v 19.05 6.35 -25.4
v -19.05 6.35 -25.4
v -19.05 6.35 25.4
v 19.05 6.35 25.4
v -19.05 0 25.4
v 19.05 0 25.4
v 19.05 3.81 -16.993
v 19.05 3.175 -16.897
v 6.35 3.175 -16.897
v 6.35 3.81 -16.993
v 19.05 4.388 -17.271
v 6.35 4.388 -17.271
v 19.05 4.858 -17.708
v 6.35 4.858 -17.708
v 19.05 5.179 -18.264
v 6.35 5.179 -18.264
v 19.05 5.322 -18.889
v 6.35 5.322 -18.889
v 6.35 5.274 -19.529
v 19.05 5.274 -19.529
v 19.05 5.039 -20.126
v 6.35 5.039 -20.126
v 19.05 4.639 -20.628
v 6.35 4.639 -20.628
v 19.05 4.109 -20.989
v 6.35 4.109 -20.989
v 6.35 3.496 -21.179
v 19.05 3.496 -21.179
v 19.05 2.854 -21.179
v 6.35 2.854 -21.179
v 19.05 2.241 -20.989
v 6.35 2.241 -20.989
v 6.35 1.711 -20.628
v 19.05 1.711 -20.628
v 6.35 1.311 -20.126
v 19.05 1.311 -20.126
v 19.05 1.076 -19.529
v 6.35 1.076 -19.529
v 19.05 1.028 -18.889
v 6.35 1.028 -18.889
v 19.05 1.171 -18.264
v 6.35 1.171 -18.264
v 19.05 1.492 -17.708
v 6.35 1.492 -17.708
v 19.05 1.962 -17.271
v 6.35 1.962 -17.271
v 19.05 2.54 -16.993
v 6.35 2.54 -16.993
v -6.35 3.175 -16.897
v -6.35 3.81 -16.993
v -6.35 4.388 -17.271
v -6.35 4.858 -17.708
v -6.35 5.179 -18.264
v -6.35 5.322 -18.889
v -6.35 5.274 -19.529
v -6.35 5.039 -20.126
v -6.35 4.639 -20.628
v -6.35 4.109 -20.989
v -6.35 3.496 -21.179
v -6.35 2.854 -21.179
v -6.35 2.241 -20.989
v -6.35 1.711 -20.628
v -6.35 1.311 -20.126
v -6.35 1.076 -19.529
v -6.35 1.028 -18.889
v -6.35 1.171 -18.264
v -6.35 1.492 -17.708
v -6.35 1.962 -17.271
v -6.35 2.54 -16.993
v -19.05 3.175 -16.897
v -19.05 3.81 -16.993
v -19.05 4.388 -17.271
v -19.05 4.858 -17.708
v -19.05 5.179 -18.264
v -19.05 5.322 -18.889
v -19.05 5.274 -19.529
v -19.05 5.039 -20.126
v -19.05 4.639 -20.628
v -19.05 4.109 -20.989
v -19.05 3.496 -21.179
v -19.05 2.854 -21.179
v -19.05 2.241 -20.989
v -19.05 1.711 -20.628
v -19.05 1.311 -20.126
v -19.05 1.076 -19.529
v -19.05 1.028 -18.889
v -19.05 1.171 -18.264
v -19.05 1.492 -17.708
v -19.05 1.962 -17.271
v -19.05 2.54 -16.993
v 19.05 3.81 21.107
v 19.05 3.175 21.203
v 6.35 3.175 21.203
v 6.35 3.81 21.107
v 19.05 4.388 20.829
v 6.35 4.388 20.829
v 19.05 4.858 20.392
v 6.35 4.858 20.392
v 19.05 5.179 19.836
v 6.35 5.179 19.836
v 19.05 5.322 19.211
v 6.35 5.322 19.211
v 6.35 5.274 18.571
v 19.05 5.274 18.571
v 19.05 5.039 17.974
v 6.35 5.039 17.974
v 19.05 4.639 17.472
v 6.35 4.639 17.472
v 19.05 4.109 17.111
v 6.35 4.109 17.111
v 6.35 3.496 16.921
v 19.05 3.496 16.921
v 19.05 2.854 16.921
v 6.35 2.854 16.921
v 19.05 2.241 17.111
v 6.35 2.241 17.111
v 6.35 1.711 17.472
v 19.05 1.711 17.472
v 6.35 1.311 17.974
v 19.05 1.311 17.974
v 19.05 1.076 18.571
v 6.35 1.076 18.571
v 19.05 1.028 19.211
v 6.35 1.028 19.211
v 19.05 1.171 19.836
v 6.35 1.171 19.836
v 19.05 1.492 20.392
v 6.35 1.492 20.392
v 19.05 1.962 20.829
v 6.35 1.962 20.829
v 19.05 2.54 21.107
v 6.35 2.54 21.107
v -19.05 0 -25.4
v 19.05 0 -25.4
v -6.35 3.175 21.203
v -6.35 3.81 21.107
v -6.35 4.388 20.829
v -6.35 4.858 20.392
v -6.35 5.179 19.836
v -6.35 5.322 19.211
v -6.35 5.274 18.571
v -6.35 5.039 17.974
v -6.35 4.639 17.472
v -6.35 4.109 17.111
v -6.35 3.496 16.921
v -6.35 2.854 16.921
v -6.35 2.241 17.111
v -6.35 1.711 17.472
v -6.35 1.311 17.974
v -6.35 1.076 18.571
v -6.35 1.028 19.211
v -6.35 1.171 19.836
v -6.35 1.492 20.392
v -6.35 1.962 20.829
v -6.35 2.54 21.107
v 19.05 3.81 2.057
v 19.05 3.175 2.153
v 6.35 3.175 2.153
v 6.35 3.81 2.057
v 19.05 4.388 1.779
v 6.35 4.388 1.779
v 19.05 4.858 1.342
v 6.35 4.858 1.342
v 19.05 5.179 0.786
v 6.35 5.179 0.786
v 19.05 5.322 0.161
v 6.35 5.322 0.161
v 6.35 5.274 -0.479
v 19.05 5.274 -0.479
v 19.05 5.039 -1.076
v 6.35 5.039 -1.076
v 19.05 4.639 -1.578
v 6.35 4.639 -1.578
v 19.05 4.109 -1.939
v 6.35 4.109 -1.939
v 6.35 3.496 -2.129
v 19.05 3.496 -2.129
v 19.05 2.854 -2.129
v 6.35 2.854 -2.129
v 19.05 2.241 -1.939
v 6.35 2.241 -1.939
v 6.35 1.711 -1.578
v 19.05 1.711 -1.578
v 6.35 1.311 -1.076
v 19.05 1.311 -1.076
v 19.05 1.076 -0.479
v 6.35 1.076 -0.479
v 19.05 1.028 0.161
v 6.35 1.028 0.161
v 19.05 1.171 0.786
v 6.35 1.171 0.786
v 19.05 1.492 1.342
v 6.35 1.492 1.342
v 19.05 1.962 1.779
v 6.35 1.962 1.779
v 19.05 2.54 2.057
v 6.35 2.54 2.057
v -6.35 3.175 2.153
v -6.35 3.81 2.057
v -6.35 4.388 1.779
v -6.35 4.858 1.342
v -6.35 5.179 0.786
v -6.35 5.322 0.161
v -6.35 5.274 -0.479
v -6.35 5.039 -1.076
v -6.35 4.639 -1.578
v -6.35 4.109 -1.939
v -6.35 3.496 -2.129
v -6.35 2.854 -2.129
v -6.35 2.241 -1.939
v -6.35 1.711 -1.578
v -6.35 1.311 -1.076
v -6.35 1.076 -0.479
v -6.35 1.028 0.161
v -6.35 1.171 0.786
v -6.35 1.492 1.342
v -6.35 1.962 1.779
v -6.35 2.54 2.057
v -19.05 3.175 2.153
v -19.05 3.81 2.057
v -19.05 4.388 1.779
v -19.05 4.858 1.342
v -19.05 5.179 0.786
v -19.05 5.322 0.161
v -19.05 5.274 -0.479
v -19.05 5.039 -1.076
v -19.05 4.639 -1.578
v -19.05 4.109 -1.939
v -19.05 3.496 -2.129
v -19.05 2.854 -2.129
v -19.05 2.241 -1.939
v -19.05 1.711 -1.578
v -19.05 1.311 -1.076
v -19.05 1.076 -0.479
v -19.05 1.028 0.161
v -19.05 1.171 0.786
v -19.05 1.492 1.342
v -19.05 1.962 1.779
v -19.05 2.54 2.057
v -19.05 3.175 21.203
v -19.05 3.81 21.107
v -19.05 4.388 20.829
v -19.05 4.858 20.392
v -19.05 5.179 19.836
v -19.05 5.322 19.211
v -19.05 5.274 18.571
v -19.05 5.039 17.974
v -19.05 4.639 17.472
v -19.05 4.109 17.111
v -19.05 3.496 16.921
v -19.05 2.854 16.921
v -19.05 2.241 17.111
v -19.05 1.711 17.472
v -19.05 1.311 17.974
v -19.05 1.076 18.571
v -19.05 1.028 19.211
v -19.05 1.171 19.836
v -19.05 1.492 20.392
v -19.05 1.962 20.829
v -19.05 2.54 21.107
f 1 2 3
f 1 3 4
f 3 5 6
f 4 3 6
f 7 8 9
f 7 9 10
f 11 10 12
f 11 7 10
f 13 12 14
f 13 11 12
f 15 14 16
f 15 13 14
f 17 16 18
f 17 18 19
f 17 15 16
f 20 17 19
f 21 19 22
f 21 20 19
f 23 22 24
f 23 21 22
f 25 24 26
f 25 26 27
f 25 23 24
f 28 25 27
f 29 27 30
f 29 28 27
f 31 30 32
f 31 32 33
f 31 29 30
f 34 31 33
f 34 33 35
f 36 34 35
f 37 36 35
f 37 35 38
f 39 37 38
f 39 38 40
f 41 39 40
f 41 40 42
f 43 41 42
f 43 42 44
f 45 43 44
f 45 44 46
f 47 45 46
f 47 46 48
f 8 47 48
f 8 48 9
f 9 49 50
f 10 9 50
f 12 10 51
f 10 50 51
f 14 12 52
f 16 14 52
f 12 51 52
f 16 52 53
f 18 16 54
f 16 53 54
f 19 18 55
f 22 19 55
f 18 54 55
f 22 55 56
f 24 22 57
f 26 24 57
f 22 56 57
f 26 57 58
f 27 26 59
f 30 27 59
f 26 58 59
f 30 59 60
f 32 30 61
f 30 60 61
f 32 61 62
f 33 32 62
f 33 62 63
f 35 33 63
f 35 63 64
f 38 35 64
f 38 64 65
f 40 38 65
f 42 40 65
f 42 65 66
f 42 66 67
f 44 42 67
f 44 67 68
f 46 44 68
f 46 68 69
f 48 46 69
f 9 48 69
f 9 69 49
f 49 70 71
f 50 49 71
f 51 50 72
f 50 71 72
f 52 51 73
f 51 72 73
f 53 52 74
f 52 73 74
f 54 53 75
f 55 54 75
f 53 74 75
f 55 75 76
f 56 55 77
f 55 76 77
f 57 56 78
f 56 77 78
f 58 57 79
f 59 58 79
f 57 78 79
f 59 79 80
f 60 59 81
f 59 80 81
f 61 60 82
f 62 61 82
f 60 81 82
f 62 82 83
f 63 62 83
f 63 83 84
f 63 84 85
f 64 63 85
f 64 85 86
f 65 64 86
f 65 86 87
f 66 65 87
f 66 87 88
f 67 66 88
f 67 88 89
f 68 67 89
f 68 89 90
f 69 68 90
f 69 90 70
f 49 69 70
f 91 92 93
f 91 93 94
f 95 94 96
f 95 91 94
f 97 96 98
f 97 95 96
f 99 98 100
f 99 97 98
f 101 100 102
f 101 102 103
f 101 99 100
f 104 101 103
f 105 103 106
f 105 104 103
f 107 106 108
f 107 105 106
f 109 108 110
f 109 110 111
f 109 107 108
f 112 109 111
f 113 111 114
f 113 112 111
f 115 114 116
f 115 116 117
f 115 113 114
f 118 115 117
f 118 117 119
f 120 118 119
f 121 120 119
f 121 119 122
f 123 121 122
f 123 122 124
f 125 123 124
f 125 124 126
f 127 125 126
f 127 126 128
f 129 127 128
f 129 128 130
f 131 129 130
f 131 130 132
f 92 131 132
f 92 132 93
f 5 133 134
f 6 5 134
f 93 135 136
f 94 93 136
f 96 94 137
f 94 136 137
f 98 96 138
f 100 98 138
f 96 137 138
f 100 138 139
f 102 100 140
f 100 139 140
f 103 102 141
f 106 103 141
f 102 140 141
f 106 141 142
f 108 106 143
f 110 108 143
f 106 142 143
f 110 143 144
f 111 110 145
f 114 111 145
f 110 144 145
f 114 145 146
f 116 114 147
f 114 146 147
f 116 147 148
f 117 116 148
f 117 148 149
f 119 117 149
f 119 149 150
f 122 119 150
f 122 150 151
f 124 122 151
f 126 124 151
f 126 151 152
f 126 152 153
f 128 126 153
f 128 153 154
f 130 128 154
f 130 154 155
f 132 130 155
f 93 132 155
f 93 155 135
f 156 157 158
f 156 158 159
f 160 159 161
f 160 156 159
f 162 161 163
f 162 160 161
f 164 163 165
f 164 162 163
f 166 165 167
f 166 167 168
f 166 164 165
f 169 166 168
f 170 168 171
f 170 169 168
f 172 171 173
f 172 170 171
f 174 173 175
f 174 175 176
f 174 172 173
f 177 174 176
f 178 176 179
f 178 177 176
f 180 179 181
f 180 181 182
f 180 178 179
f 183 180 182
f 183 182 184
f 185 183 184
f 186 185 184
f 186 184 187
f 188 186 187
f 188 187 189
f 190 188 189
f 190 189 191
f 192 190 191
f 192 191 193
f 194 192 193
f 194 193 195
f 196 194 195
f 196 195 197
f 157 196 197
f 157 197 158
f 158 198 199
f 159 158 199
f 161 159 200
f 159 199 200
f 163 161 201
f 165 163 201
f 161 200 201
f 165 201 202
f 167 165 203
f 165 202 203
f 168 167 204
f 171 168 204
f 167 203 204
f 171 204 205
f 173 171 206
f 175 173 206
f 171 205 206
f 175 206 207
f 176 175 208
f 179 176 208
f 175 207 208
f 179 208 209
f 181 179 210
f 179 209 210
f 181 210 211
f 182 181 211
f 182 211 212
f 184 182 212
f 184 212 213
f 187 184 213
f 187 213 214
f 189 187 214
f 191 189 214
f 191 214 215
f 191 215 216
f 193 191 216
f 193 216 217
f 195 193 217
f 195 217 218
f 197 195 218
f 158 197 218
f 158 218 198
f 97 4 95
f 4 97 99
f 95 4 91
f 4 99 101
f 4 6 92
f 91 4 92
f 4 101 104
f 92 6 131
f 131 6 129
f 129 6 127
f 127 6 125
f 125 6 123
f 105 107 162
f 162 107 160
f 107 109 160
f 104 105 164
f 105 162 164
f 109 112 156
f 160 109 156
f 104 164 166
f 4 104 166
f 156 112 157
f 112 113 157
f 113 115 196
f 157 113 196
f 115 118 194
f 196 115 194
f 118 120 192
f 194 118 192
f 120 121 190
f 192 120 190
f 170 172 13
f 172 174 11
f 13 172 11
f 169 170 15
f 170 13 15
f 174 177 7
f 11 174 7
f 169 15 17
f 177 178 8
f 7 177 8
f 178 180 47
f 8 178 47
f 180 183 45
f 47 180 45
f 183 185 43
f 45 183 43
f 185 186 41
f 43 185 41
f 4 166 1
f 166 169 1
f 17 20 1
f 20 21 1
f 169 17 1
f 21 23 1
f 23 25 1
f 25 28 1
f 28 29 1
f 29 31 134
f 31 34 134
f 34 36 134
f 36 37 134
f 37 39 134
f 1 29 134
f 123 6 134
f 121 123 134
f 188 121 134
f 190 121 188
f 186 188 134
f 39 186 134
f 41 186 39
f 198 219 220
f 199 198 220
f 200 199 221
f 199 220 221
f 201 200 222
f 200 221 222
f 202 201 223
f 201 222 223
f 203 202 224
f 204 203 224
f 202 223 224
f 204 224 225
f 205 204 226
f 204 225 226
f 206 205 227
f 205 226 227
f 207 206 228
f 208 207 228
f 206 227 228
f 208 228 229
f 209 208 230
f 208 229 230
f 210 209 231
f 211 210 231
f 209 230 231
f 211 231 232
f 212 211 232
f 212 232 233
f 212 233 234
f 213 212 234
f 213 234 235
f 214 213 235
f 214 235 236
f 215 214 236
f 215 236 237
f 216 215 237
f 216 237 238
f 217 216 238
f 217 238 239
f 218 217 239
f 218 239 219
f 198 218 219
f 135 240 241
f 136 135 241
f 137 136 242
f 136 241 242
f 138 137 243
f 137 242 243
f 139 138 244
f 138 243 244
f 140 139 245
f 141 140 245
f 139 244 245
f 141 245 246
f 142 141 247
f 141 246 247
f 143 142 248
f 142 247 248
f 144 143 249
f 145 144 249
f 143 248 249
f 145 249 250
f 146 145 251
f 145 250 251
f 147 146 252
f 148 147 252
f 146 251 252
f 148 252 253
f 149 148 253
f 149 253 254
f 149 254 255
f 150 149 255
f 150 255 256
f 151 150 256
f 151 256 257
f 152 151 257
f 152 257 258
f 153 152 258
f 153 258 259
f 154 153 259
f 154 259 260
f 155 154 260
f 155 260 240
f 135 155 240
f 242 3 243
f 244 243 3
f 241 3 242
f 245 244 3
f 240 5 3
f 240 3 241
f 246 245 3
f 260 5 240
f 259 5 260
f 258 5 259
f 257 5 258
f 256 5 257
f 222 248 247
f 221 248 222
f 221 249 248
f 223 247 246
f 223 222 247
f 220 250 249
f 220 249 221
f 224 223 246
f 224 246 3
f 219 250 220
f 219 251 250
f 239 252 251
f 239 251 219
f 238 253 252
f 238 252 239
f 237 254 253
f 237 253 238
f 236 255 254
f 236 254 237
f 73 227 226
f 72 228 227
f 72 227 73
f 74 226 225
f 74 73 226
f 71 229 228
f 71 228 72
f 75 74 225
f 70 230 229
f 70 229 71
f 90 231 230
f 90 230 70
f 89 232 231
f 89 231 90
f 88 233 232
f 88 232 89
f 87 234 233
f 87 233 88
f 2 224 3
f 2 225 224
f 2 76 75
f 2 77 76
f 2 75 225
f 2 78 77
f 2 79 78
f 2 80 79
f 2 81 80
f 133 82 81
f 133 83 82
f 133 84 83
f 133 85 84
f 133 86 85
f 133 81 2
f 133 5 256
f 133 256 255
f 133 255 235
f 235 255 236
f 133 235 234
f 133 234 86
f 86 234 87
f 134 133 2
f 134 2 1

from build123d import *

# Parameters (mm, degrees)
SKETCH1_W           = 38.1
SKETCH1_H           = 50.8
BOSS_EXTRUDE1_DEPTH = 6.35
SKETCH2_R           = 2.15265
CUT_EXTRUDE1_DEPTH  = 25.4


with BuildPart() as part:
    # Sketch1 → Boss-Extrude1 (new body)
    with BuildSketch(Plane(origin=(0, 0, 0), x_dir=(1, 0, 0), z_dir=(0, 1, 0))):
        Rectangle(SKETCH1_W, SKETCH1_H)
    extrude(amount=BOSS_EXTRUDE1_DEPTH)

    # Sketch2 → Cut-Extrude1 (cut)
    with BuildSketch(Plane.ZY.offset(19.05)):
        with Locations((-19.05, 3.175)):
            Circle(SKETCH2_R)
        with Locations((0, 3.175)):
            Circle(SKETCH2_R)
        with Locations((19.05, 3.175)):
            Circle(SKETCH2_R)
    cut_extrude1 = extrude(amount=-CUT_EXTRUDE1_DEPTH, mode=Mode.SUBTRACT)

    # Mirror1: Cut-Extrude1 across plane
    add(cut_extrude1.mirror(Plane(origin=(0, 0, 0), x_dir=(0, 0, 1), z_dir=(1, 0, 0))), mode=Mode.SUBTRACT)


solid = part.part
